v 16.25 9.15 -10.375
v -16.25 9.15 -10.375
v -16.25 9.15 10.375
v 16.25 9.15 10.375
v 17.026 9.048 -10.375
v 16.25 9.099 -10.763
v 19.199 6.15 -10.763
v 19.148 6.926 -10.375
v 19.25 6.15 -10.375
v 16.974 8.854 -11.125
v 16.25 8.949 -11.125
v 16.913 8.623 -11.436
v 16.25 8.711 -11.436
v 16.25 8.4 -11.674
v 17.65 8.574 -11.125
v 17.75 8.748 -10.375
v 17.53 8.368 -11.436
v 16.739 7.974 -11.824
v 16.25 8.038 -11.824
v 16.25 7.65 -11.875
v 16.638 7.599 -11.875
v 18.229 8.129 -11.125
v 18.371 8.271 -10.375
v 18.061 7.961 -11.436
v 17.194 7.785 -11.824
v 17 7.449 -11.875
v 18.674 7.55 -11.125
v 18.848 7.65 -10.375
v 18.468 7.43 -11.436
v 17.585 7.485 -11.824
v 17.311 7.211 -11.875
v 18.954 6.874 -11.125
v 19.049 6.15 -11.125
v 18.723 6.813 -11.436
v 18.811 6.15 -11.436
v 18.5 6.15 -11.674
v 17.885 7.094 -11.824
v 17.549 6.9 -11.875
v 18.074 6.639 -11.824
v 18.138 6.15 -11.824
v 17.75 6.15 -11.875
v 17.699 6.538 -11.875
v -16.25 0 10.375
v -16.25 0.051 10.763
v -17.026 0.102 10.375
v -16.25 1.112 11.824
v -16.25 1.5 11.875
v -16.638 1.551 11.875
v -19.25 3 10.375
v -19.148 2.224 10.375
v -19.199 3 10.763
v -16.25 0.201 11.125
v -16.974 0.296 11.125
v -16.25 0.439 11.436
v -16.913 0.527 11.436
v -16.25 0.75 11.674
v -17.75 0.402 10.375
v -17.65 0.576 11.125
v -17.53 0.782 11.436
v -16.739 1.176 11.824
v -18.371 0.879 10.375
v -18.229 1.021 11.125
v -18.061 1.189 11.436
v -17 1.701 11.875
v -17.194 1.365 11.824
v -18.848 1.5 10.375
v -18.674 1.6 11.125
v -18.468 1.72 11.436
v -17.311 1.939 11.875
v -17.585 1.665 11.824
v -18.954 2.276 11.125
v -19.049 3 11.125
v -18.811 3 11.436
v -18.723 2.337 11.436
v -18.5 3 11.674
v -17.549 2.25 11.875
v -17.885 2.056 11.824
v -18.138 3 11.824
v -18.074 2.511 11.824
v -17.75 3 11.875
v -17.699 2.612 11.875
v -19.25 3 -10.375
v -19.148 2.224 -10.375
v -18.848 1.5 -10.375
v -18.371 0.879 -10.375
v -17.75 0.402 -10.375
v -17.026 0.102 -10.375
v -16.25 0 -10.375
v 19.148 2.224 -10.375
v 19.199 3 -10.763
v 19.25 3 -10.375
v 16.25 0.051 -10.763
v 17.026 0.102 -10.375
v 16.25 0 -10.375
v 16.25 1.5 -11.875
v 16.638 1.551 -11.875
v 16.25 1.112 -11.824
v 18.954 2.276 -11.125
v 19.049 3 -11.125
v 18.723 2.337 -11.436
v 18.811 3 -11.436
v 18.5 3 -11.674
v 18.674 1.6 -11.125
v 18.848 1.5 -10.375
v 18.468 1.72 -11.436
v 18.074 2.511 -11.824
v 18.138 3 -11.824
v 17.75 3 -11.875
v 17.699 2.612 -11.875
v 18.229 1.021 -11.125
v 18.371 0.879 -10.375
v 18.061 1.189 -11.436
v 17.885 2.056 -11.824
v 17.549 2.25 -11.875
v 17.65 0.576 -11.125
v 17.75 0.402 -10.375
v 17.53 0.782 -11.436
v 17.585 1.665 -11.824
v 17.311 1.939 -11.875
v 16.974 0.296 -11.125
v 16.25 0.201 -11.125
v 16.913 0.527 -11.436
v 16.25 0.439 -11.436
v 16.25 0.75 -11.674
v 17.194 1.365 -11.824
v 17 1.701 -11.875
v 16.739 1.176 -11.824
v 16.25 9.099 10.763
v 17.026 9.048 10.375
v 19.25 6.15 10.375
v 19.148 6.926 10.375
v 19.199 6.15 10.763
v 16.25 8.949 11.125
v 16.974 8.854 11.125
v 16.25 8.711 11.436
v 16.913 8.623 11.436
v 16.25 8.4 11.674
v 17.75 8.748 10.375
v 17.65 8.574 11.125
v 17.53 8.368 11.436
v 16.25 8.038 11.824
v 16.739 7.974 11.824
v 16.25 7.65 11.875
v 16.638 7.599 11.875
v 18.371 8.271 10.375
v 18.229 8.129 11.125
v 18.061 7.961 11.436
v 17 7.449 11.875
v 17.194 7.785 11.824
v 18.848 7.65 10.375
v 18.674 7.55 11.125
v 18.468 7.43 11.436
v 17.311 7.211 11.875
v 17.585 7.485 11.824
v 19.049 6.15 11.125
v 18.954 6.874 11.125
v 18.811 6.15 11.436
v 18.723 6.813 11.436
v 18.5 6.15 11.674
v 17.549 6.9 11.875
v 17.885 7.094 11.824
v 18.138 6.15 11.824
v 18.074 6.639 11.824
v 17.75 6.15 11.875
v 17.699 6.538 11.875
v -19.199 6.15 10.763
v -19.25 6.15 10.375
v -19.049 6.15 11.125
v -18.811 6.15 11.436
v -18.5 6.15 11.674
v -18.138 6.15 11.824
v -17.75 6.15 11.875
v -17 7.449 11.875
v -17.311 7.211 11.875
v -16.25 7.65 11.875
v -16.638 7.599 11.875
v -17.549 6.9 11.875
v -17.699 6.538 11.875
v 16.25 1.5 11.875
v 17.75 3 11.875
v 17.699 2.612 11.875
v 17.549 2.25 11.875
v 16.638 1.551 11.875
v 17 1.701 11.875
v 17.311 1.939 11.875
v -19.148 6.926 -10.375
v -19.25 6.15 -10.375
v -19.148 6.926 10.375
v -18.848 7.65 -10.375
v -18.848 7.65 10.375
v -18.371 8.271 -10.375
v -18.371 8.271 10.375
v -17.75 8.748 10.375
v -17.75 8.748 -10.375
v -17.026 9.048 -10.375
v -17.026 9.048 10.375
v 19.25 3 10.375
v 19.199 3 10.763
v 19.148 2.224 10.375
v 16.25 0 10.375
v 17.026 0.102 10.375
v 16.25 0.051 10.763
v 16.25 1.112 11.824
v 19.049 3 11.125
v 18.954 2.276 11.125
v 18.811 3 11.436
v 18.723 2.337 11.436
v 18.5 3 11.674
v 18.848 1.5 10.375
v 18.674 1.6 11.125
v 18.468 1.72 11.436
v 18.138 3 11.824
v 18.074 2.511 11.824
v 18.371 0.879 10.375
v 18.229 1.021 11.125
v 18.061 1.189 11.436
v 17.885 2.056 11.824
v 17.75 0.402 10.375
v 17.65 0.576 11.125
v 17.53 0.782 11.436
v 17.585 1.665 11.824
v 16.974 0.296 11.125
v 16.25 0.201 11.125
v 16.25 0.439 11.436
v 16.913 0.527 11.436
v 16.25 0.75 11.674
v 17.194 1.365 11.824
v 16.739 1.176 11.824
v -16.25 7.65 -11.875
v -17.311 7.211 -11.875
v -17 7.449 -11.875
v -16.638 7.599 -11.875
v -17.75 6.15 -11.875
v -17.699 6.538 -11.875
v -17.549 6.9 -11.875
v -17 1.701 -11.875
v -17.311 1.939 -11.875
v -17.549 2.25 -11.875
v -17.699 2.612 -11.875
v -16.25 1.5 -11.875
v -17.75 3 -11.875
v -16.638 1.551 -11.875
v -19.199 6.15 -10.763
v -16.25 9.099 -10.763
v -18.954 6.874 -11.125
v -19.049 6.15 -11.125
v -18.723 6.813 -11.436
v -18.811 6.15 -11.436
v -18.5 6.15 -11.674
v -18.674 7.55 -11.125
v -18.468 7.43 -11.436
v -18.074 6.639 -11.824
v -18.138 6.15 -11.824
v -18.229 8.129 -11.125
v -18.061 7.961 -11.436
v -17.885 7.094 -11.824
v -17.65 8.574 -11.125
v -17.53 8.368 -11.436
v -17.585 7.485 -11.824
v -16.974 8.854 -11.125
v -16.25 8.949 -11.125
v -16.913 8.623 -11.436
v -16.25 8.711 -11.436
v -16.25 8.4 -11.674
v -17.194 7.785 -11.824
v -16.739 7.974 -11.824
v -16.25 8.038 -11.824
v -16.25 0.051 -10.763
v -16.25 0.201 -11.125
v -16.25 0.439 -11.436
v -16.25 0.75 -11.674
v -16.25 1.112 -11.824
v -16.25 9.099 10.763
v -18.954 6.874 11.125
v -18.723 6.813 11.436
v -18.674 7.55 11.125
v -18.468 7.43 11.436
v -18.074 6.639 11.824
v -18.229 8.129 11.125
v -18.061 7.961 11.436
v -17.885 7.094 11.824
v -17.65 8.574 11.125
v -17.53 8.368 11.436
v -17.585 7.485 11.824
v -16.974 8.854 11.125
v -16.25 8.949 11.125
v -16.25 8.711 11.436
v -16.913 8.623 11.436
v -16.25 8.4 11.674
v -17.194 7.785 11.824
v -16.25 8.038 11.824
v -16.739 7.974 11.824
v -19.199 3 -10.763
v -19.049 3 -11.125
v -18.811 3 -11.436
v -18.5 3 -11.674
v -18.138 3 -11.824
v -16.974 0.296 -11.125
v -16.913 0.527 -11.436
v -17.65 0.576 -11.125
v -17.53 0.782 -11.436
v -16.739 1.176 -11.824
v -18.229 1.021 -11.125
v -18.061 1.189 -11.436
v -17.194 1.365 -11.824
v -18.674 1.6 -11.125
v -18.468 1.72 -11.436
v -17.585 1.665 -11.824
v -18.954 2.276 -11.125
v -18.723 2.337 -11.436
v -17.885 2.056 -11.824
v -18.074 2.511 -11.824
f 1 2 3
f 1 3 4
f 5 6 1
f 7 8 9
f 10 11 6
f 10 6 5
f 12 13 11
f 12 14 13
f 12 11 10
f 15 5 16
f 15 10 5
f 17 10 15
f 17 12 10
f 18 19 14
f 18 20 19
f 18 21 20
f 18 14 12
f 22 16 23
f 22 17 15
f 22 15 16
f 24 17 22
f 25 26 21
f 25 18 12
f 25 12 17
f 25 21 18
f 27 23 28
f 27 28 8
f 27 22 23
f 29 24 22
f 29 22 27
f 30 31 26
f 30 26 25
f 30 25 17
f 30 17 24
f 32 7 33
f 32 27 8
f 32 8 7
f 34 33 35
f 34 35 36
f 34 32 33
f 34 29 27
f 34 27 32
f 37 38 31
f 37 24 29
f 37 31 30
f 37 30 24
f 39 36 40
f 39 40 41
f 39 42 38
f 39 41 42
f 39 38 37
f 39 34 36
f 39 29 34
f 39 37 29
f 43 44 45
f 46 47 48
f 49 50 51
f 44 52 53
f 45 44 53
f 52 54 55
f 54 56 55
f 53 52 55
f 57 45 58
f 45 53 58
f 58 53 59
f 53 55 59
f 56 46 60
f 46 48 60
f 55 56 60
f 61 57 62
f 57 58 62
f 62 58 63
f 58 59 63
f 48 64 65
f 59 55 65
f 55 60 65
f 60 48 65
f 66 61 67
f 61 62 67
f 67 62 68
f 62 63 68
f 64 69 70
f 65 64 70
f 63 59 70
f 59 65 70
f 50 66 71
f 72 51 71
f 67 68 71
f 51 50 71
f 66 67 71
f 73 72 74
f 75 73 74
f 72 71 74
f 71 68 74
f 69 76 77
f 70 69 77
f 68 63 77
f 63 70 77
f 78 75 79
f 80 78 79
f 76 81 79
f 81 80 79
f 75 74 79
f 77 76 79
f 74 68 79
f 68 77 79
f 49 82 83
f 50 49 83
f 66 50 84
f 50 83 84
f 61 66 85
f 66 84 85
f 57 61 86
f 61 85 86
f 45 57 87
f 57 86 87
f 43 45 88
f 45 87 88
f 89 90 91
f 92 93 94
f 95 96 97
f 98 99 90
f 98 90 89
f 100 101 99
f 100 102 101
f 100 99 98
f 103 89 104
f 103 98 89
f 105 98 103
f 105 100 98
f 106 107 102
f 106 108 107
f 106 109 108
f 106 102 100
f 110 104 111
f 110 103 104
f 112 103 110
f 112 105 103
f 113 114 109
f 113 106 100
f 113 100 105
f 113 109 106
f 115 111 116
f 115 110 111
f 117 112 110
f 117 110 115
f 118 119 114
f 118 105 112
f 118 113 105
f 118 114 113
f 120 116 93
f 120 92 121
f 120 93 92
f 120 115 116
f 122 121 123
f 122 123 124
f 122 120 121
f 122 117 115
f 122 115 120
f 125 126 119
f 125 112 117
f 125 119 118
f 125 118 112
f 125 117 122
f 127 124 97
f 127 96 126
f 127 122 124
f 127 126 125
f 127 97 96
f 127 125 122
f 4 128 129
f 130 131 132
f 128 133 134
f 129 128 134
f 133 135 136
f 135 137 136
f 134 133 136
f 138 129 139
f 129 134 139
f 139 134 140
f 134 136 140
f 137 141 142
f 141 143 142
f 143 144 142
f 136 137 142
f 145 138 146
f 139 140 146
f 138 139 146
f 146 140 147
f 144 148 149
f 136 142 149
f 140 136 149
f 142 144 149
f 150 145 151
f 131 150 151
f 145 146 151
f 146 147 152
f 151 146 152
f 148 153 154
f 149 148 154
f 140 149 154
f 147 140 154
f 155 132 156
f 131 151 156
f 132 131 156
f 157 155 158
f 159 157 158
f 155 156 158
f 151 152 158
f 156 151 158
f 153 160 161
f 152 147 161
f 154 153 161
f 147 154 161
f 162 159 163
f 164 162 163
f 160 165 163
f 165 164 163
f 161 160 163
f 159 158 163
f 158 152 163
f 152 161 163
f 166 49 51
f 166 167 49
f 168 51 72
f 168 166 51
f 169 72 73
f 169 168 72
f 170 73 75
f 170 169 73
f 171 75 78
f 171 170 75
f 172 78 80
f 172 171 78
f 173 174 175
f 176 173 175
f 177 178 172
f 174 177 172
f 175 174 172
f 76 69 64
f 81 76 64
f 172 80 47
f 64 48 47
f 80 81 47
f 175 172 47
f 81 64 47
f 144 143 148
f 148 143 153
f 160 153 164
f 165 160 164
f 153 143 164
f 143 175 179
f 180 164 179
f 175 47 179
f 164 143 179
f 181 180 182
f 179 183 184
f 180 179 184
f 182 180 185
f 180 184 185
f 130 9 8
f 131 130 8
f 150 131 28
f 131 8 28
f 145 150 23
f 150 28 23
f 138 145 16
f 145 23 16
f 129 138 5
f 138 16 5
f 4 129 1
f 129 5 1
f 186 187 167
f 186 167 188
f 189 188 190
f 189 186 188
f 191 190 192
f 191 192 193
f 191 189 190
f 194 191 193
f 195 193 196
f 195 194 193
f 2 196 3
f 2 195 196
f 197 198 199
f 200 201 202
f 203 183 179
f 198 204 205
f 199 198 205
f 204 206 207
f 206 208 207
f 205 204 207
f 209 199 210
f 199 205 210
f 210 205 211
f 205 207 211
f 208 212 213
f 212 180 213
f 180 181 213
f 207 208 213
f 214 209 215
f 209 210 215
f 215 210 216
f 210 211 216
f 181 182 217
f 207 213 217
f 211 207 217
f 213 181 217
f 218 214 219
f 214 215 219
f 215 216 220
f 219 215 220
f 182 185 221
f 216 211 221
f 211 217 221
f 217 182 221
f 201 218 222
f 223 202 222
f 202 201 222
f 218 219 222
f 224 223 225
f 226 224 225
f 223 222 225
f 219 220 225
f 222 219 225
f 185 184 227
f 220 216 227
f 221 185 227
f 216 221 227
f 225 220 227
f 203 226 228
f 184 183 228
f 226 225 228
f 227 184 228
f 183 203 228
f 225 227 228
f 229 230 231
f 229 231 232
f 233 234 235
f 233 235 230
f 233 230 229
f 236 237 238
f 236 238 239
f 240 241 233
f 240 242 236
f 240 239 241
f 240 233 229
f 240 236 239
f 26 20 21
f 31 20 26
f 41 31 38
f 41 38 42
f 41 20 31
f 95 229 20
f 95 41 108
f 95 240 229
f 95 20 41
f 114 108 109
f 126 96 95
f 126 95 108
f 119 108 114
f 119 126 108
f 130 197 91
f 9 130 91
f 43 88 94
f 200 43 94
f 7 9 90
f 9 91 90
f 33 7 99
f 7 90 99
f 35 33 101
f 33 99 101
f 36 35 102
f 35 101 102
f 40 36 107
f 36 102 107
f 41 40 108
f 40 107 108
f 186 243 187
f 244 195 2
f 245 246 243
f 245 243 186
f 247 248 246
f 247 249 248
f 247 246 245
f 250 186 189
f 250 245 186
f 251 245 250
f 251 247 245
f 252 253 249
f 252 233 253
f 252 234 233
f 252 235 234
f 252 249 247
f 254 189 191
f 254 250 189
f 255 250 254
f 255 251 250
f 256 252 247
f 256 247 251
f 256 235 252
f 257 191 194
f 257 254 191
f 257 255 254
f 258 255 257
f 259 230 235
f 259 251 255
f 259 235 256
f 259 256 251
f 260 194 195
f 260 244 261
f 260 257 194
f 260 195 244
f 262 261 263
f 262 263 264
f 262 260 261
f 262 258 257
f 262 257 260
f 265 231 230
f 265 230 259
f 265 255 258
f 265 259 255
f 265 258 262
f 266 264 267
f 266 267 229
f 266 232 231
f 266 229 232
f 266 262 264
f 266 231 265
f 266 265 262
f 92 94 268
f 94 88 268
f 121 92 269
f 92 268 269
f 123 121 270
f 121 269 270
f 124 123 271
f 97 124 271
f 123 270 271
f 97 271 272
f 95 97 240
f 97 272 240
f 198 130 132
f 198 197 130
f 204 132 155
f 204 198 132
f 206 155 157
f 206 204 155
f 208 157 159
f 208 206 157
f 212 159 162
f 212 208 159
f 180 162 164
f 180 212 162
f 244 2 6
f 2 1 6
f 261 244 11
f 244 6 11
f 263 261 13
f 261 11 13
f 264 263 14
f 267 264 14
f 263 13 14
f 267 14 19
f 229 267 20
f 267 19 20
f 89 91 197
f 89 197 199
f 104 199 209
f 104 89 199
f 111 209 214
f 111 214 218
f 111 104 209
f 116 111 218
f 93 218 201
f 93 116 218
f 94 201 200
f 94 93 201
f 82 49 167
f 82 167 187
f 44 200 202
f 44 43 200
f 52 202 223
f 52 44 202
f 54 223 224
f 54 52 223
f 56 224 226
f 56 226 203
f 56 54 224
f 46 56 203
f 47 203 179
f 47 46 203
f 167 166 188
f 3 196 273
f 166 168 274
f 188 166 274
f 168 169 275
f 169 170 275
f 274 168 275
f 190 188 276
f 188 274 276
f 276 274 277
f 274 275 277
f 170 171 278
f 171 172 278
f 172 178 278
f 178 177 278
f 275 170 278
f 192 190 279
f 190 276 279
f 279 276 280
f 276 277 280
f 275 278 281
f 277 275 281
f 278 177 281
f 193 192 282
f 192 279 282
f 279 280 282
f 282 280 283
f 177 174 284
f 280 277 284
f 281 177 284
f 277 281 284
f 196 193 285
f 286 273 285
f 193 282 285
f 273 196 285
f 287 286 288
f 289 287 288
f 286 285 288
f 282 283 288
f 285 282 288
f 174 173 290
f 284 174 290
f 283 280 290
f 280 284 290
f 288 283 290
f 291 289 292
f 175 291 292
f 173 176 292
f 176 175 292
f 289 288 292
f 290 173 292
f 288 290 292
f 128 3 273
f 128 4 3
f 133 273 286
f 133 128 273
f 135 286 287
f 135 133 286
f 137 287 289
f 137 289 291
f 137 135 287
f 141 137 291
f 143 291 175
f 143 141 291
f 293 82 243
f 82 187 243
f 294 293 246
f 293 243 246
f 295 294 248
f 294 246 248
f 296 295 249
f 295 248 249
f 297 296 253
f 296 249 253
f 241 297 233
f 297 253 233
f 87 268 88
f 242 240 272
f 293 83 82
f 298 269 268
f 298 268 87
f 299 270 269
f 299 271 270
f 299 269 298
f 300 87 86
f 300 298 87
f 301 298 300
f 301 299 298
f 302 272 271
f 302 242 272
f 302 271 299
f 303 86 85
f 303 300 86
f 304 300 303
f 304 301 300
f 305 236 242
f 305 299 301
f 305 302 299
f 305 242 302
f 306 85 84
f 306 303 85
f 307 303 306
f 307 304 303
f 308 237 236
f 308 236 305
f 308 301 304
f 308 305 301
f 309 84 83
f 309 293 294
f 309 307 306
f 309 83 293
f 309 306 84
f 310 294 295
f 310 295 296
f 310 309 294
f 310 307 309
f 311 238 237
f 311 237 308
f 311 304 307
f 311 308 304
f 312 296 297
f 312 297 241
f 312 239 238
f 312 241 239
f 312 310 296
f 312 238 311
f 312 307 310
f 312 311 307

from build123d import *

# Parameters (mm, degrees)
SKETCH1_W           = 38.5
SKETCH1_H           = 23.75
BOSS_EXTRUDE1_DEPTH = 9.15
FILLET1_R           = 3
FILLET2_R           = 1.5


with BuildPart() as part:
    # Sketch1 → Boss-Extrude1 (new body)
    with BuildSketch(Plane(origin=(0, 0, 0), x_dir=(1, 0, 0), z_dir=(0, 1, 0))):
        Rectangle(SKETCH1_W, SKETCH1_H)
    extrude(amount=BOSS_EXTRUDE1_DEPTH)

    # Fillet1
    fillet1_edges = [part.edges().sort_by_distance(p)[0] for p in [
        (-19.25, 9.15, 0),
        (19.25, 9.15, 0),
        (-19.25, 0, 0),
        (19.25, 0, 0),
    ]]
    fillet(fillet1_edges, radius=FILLET1_R)

    # Fillet2
    fillet2_edges = [part.edges().sort_by_distance(p)[0] for p in [
        (-19.25, 4.575, 11.875),
        (-19.25, 4.575, -11.875),
        (0, 0, 11.875),
        (19.25, 4.575, 11.875),
        (0, 9.15, 11.875),
        (18.371320344, 8.271320344, 11.875),
        (18.371320344, 0.878679656, 11.875),
        (-18.371320344, 8.271320344, 11.875),
        (-18.371320344, 0.878679656, 11.875),
        (0, 0, -11.875),
        (0, 9.15, -11.875),
        (19.25, 4.575, -11.875),
        (18.371320344, 8.271320344, -11.875),
        (18.371320344, 0.878679656, -11.875),
        (-18.371320344, 8.271320344, -11.875),
        (-18.371320344, 0.878679656, -11.875),
    ]]
    fillet(fillet2_edges, radius=FILLET2_R)


solid = part.part
